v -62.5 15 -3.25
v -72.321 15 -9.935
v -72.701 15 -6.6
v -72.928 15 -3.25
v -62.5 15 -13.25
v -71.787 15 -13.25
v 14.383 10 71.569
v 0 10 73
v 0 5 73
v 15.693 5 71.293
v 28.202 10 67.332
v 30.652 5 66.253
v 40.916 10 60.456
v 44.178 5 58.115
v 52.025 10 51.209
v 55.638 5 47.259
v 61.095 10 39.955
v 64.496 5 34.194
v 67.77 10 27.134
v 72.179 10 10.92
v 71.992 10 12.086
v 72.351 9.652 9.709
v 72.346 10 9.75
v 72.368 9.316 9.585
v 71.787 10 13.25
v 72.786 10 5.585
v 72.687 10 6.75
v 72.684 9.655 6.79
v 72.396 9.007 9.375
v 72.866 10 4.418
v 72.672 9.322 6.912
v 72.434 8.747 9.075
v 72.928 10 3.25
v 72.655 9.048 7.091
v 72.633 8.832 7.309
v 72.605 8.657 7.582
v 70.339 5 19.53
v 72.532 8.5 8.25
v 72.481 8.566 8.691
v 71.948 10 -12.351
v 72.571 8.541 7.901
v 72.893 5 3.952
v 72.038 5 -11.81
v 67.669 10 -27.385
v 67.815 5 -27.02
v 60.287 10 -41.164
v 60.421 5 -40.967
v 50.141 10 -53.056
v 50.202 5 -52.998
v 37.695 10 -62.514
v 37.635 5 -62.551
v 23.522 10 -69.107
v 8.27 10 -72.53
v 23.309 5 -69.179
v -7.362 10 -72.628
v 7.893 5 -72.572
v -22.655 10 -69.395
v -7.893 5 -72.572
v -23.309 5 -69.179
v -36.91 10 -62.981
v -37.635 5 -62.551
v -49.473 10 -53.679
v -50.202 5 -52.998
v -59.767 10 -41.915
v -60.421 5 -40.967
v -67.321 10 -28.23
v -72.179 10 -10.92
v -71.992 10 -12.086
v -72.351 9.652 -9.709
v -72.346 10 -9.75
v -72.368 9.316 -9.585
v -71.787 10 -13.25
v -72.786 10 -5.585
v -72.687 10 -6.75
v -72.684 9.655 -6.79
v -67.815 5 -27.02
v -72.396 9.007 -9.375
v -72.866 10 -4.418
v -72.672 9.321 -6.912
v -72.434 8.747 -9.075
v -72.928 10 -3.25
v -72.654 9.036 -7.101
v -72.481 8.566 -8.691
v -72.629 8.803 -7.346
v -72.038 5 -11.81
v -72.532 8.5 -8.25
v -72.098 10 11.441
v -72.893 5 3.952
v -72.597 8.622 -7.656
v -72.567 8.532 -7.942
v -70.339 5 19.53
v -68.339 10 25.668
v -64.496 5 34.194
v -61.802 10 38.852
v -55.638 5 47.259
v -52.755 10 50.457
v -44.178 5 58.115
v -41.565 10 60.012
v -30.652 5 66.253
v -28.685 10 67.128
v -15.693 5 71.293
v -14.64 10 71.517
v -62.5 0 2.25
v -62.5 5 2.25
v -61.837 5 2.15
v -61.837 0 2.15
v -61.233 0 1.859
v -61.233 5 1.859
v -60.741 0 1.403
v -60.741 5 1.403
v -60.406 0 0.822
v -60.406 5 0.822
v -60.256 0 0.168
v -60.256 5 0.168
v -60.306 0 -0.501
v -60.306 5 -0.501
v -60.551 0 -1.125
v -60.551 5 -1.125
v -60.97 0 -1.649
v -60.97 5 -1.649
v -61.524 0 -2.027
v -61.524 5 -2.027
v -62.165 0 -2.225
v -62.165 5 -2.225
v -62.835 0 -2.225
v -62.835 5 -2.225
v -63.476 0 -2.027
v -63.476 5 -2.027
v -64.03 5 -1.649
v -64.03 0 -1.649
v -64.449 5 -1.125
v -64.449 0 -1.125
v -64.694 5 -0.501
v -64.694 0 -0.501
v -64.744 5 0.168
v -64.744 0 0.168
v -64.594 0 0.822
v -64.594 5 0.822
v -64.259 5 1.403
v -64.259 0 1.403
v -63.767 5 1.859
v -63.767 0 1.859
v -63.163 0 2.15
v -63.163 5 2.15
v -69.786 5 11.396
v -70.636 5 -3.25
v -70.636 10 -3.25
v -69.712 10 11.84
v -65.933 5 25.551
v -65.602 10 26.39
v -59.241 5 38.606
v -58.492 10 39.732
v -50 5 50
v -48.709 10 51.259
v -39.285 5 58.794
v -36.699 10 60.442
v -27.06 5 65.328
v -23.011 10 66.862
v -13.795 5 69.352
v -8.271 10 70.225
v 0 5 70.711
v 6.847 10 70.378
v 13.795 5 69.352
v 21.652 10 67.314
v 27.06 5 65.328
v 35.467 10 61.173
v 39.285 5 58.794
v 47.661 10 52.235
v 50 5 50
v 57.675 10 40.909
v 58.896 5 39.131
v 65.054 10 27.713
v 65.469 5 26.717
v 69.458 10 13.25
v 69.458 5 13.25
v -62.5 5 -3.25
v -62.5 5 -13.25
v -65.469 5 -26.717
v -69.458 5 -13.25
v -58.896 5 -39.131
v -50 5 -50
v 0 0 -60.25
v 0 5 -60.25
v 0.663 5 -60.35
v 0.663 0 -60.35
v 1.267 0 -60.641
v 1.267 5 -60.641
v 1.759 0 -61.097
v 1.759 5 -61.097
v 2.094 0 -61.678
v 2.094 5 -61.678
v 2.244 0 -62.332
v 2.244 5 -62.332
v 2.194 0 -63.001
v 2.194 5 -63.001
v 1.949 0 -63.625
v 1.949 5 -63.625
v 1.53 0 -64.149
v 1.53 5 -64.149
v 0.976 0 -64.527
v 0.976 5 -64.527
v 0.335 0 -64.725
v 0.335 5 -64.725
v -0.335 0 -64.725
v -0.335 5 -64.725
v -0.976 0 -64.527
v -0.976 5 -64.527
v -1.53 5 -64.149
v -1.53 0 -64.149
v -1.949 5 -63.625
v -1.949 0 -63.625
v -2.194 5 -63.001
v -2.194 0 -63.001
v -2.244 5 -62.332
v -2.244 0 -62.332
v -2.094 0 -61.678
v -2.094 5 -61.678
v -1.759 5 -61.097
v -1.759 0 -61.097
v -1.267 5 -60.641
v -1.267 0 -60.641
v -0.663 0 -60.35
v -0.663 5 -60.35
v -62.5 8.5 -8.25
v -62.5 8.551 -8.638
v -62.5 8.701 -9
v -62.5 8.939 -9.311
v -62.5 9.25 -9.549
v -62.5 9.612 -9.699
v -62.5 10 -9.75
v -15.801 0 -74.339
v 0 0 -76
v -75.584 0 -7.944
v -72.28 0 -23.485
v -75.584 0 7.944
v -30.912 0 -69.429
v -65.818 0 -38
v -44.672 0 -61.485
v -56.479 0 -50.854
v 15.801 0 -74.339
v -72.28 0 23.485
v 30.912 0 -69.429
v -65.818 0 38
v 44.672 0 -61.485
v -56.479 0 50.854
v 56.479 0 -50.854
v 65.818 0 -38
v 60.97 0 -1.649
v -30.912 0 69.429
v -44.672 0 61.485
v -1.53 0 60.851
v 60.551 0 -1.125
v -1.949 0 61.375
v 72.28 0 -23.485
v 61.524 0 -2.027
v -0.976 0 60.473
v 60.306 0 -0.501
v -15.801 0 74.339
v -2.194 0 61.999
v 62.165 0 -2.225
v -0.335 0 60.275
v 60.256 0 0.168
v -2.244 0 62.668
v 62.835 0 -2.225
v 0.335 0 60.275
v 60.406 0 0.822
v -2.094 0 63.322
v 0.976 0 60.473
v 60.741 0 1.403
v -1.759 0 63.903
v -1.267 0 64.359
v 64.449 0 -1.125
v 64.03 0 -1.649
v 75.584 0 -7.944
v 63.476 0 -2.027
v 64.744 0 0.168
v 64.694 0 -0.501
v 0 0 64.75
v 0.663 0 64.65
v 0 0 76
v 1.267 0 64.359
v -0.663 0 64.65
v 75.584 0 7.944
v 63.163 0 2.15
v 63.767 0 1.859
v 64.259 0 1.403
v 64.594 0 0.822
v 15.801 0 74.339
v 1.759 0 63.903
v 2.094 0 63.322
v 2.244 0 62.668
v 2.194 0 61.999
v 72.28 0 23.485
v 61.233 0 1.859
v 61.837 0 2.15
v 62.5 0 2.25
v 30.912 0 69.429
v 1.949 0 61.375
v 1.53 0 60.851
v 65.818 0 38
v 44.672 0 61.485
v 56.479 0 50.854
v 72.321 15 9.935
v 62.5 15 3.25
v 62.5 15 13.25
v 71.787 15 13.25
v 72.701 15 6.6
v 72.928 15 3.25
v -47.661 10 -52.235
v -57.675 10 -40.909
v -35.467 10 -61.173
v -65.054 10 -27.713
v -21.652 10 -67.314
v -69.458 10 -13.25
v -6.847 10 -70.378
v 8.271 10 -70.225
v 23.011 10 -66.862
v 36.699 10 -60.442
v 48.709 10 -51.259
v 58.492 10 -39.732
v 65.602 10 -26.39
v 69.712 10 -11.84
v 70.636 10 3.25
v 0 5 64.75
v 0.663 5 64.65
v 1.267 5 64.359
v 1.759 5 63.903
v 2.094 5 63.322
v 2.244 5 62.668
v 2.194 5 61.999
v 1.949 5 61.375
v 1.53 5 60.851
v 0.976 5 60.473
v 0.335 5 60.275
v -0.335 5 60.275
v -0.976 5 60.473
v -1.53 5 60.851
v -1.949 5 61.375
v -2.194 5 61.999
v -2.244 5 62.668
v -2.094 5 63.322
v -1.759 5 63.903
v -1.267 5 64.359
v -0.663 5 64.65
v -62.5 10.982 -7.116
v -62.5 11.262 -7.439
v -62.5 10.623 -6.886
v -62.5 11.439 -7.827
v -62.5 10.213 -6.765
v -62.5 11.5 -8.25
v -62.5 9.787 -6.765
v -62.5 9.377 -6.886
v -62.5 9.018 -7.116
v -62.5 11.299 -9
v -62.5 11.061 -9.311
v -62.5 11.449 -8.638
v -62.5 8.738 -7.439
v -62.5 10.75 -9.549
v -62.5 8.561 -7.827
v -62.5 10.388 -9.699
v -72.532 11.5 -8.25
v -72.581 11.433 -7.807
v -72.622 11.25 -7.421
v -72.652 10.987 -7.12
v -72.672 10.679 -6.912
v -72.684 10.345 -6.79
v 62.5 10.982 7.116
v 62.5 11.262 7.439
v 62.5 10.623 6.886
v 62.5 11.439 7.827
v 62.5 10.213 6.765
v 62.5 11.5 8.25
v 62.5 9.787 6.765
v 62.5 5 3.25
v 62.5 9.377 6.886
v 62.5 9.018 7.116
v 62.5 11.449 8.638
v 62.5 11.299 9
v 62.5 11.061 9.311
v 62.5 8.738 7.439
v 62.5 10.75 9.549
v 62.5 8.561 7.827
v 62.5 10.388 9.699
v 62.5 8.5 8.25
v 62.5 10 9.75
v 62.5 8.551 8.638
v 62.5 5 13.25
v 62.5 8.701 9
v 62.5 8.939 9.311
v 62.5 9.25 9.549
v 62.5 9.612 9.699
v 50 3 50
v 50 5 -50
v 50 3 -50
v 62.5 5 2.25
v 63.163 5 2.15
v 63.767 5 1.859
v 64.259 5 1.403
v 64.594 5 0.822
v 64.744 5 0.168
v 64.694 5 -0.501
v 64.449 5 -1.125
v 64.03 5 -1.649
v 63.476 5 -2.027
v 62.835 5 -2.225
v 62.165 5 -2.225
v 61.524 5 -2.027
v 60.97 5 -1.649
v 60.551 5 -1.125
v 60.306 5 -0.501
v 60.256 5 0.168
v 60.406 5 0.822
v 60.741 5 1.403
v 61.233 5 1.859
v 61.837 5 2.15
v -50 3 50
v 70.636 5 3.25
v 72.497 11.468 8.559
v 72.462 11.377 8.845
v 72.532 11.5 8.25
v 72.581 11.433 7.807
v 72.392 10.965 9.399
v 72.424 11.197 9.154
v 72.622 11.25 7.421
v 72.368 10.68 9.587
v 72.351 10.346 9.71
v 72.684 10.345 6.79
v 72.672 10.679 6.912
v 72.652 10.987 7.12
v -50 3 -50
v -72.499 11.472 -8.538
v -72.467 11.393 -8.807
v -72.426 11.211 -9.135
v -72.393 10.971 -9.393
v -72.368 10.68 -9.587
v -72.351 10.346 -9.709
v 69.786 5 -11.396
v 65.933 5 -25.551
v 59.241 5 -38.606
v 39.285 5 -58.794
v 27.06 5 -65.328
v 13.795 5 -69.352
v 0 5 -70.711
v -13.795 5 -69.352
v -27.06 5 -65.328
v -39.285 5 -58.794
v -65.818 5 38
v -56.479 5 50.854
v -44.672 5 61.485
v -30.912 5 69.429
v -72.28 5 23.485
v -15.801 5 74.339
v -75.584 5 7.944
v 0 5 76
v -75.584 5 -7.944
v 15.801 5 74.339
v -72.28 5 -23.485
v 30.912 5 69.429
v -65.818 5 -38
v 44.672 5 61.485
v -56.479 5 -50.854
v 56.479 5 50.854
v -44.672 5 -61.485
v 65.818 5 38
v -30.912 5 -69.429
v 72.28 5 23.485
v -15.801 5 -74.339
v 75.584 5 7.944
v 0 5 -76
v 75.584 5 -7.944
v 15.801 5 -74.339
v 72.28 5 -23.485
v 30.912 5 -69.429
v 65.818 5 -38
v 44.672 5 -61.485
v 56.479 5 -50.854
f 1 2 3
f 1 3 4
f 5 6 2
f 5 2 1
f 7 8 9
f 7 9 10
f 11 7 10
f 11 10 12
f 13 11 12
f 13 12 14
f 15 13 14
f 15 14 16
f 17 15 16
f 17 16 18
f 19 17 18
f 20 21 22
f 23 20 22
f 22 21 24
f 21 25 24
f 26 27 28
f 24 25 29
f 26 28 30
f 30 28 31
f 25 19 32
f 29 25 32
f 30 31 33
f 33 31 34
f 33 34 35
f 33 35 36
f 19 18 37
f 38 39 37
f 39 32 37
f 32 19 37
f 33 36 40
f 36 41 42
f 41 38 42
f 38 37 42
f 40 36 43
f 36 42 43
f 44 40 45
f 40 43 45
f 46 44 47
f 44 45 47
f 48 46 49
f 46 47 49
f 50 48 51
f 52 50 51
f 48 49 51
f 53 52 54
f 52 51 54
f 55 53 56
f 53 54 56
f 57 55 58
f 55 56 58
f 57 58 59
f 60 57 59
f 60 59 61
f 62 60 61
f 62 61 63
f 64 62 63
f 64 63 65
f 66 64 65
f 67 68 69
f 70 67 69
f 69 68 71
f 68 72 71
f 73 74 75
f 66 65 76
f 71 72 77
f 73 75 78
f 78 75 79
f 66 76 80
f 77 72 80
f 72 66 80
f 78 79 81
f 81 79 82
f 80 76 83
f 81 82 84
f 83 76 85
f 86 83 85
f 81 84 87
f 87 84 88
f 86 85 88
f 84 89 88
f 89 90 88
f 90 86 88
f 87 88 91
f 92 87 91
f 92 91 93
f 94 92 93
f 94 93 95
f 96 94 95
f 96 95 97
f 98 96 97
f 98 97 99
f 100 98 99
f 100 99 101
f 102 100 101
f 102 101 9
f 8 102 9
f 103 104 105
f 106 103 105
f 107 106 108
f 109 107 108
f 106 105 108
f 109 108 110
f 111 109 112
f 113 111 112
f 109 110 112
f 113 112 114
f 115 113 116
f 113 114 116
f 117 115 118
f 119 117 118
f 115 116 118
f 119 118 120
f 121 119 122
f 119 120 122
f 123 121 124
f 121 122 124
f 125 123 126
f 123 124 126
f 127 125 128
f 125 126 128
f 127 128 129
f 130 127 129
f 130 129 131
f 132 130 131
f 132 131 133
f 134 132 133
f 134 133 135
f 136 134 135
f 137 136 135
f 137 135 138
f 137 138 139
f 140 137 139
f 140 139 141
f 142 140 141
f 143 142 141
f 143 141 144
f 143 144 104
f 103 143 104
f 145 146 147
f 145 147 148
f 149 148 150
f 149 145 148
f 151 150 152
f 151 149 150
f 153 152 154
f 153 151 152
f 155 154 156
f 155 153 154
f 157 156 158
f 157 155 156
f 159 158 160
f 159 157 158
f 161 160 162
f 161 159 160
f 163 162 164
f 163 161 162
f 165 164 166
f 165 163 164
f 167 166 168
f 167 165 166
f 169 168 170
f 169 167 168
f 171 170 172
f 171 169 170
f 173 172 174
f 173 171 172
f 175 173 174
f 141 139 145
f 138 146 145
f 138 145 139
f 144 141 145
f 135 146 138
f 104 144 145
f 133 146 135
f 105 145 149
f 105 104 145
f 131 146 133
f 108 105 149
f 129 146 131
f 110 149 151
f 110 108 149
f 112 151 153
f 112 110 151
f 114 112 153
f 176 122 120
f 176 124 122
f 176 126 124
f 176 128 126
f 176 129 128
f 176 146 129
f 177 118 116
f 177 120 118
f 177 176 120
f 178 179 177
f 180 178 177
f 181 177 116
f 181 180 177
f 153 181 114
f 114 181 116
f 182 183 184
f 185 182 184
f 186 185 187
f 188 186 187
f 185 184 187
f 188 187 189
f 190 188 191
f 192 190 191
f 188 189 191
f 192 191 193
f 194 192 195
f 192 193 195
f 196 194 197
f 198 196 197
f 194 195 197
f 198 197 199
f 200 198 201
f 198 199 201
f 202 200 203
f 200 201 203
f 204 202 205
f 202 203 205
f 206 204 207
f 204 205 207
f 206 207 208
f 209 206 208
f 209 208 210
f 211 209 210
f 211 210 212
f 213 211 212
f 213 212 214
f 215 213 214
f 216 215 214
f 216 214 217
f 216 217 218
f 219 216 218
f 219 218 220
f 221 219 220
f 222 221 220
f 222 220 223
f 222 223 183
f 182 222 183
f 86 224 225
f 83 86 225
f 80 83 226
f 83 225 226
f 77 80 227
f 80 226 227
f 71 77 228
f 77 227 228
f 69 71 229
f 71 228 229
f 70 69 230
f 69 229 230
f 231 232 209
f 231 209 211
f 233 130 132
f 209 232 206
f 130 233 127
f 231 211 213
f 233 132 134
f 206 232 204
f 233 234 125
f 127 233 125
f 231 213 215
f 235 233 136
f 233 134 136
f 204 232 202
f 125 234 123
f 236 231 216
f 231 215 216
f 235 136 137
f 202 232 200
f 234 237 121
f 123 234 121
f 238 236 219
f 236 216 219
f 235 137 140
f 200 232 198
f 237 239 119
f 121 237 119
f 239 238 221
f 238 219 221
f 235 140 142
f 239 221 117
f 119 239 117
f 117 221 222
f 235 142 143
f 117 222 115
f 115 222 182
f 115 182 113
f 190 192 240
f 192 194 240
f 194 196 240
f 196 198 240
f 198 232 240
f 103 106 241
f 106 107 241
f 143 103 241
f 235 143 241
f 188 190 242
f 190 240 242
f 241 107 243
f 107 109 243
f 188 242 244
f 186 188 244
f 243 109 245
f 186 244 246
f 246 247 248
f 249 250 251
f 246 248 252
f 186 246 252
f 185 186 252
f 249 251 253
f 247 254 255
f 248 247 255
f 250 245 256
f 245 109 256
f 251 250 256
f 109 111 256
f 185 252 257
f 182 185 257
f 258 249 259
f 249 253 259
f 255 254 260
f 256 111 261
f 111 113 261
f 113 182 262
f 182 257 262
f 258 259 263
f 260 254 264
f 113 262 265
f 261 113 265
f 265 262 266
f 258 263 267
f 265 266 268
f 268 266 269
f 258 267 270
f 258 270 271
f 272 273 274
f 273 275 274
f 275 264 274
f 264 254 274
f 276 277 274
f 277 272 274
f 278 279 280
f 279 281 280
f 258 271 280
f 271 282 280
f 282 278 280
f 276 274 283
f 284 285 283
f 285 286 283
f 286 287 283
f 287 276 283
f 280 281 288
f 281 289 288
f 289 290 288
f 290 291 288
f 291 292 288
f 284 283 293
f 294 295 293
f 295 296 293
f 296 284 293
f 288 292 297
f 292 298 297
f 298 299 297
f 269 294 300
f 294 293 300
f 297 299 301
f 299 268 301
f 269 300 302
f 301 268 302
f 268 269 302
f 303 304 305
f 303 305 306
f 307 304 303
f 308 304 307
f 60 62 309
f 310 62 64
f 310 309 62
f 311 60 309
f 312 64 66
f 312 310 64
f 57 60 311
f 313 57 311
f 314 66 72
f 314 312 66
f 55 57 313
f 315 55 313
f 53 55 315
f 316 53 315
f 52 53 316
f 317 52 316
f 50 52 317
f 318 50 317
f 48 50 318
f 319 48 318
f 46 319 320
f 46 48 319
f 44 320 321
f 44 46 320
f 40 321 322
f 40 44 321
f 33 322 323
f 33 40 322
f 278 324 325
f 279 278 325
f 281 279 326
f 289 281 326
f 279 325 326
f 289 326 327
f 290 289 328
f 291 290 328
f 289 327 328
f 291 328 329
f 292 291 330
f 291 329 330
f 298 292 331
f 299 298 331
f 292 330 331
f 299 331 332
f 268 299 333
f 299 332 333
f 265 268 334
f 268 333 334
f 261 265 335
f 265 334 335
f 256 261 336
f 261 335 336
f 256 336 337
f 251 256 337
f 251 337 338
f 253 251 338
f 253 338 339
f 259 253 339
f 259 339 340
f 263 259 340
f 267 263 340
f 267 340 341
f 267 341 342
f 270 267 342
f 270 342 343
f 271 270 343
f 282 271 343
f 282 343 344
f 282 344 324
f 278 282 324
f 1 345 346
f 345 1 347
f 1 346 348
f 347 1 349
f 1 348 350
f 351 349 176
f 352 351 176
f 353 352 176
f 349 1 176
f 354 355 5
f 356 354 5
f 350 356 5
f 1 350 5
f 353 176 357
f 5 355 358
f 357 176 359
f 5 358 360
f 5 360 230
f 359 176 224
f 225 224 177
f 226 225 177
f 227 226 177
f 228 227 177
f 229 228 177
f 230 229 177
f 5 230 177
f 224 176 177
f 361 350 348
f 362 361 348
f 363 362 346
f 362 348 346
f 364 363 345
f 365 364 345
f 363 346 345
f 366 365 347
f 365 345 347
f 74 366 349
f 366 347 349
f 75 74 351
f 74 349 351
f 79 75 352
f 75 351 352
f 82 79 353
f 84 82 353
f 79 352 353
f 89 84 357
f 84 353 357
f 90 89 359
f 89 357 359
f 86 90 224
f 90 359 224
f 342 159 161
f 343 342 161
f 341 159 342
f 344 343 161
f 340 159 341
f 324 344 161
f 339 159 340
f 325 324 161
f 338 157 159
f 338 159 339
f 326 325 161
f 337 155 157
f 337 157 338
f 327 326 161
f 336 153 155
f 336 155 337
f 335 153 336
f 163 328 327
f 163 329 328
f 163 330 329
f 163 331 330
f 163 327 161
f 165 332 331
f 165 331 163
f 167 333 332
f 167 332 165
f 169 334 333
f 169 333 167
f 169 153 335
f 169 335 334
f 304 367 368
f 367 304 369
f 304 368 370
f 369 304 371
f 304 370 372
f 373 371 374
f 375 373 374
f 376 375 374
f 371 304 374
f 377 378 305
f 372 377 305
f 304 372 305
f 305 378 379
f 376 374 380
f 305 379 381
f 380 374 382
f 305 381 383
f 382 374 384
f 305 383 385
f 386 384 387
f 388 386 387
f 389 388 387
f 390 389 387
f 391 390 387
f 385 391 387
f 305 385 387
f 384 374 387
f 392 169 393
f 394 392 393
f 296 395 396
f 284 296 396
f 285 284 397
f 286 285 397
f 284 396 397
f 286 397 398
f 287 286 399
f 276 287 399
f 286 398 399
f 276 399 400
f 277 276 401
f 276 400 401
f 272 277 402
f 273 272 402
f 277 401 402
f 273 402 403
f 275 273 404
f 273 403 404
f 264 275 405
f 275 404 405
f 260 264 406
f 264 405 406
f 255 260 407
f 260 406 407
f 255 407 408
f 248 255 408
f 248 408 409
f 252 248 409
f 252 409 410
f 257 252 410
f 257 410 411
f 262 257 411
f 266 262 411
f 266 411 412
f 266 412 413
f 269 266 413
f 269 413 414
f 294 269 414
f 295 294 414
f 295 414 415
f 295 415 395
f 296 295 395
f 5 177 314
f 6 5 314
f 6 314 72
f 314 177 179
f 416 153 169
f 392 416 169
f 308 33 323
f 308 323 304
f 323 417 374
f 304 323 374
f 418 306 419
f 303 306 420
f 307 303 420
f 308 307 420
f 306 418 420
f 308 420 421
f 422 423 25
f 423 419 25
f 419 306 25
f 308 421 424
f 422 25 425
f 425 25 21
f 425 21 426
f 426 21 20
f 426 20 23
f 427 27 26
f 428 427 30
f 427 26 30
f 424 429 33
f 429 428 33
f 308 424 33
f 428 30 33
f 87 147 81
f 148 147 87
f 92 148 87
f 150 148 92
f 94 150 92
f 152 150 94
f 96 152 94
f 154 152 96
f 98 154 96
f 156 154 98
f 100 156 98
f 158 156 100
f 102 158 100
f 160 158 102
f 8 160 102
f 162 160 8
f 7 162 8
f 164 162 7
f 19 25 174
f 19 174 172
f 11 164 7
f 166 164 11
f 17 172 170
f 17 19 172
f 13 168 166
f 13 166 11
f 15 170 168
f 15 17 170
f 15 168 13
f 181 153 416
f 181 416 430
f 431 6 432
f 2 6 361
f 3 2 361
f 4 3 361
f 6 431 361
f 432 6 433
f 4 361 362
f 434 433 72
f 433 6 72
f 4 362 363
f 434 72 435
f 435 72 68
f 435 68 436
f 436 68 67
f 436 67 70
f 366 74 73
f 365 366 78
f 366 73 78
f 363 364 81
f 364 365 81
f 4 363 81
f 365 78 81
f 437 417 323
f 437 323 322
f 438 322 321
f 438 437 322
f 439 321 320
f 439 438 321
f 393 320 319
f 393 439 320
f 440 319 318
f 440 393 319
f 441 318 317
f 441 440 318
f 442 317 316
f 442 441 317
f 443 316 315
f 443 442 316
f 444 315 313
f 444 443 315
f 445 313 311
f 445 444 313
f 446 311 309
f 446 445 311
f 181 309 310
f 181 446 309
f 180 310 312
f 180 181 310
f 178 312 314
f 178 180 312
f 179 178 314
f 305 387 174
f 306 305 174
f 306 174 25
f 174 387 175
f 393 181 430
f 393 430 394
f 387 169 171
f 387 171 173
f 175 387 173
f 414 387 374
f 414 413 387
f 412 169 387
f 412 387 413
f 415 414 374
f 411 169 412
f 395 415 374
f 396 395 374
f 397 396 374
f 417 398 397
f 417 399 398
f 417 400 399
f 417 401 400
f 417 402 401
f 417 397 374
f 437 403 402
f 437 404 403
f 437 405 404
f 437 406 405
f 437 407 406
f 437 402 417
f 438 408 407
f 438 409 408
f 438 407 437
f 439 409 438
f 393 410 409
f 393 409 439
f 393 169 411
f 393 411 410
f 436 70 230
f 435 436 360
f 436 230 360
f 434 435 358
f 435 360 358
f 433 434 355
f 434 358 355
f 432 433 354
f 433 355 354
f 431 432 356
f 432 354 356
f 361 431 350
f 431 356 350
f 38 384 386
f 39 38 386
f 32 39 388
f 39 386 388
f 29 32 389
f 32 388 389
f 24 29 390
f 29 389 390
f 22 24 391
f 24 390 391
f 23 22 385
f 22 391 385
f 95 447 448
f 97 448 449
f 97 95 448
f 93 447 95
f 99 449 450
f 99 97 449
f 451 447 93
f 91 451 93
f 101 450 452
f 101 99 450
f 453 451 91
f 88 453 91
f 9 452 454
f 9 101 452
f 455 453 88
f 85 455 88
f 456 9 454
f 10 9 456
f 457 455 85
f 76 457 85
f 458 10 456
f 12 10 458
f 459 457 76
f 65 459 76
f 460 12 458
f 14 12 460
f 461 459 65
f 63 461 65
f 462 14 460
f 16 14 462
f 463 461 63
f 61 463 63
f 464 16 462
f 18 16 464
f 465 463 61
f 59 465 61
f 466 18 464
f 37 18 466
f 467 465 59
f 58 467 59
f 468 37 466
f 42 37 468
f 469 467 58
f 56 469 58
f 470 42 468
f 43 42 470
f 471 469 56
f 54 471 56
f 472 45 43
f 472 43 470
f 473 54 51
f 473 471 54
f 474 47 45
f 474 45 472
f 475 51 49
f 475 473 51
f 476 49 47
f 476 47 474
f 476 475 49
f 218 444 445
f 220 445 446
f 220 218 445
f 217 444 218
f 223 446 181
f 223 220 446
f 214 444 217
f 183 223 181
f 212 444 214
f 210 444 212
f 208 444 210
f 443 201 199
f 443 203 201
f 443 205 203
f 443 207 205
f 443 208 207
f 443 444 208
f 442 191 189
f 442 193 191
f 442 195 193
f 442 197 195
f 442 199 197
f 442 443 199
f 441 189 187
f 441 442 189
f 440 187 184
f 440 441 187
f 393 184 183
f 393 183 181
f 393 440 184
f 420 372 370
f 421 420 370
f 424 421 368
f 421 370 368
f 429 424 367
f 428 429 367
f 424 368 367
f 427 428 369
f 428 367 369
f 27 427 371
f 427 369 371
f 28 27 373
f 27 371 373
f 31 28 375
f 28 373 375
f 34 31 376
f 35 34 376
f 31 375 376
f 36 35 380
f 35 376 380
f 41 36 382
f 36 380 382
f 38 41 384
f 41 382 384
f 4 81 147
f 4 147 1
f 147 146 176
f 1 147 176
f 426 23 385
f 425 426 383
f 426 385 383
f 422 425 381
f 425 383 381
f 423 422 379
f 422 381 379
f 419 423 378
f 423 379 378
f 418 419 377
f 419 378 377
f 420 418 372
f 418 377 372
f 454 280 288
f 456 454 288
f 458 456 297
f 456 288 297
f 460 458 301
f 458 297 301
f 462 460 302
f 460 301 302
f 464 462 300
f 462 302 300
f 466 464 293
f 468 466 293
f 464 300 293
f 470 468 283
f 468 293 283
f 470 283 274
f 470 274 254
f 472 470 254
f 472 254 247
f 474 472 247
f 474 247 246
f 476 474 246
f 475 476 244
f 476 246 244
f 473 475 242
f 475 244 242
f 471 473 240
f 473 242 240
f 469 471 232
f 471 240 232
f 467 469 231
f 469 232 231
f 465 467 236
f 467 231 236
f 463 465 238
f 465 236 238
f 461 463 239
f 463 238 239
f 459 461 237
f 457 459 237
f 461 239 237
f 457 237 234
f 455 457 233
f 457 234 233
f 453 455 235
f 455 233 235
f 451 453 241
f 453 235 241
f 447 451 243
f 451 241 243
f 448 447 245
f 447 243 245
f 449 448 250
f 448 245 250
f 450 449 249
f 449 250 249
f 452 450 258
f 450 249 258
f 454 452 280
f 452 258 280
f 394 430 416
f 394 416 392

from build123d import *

# Parameters (mm, degrees)
SKETCH1_R           = 76
SKETCH1_W           = 100
SKETCH1_H           = 100
BOSS_EXTRUDE1_DEPTH = 5
SKETCH3_W           = 100
SKETCH3_H           = 100
BOSS_EXTRUDE2_DEPTH = 5
SKETCH3_2_W         = 100
SKETCH3_2_H         = 100
CUT_EXTRUDE1_DEPTH  = 2
SKETCH6_R           = 2.25
CUT_EXTRUDE2_DEPTH  = 10
SKETCH8_R           = 73
SKETCH8_R_2         = 70.710678119
BOSS_EXTRUDE3_DEPTH = 5
BOSS_EXTRUDE4_DEPTH = 10
BOSS_EXTRUDE5_DEPTH = 5
BOSS_EXTRUDE7_DEPTH = 10
BOSS_EXTRUDE8_DEPTH = 5
SKETCH17_R          = 1.5
CUT_EXTRUDE3_DEPTH  = 27
SKETCH18_R          = 1.5
CUT_EXTRUDE4_DEPTH  = 27


with BuildPart() as part:
    # Sketch1 → Boss-Extrude1 (new body)
    with BuildSketch(Plane(origin=(0, 0, 0), x_dir=(1, 0, 0), z_dir=(0, 1, 0))):
        Circle(SKETCH1_R)
        Rectangle(SKETCH1_W, SKETCH1_H, mode=Mode.SUBTRACT)
    extrude(amount=BOSS_EXTRUDE1_DEPTH)

    # Sketch3 → Boss-Extrude2 (add)
    with BuildSketch(Plane(origin=(0, 5, 0), x_dir=(1, 0, 0), z_dir=(0, 1, 0))):
        Rectangle(SKETCH3_W, SKETCH3_H)
    extrude(amount=-BOSS_EXTRUDE2_DEPTH)

    # Sketch3<2> → Cut-Extrude1 (cut)
    with BuildSketch(Plane(origin=(0, 5, 0), x_dir=(1, 0, 0), z_dir=(0, 1, 0))):
        Rectangle(SKETCH3_2_W, SKETCH3_2_H)
    extrude(amount=-CUT_EXTRUDE1_DEPTH, mode=Mode.SUBTRACT)

    # Sketch6 → Cut-Extrude2 (cut)
    with BuildSketch(Plane(origin=(0, 5, 0), x_dir=(1, 0, 0), z_dir=(0, 1, 0))):
        with Locations((0, 62.5)):
            Circle(SKETCH6_R)
        with Locations((62.5, 0)):
            Circle(SKETCH6_R)
        with Locations((0, -62.5)):
            Circle(SKETCH6_R)
        with Locations((-62.5, 0)):
            Circle(SKETCH6_R)
    extrude(amount=-CUT_EXTRUDE2_DEPTH, mode=Mode.SUBTRACT)

    # Sketch8 → Boss-Extrude3 (add)
    with BuildSketch(Plane(origin=(0, 5, 0), x_dir=(1, 0, 0), z_dir=(0, 1, 0))):
        Circle(SKETCH8_R)
        Circle(SKETCH8_R_2, mode=Mode.SUBTRACT)
    extrude(amount=BOSS_EXTRUDE3_DEPTH)

    # Sketch11 → Boss-Extrude4 (add)
    with BuildSketch(Plane(origin=(0, 5, 0), x_dir=(1, 0, 0), z_dir=(0, 1, 0))):
        with BuildLine():
            Line((70.635950478, -3.25), (62.5, -3.25))
            Line((62.5, -3.25), (62.5, -13.25))
            Line((62.5, -13.25), (69.458170866, -13.25))
            ThreePointArc((69.458170866, -13.25), (70.225285395, -8.270990945), (70.635950478, -3.25))
        make_face()
    extrude(amount=BOSS_EXTRUDE4_DEPTH)

    # Sketch12 → Boss-Extrude5 (add)
    with BuildSketch(Plane(origin=(0, 10, 0), x_dir=(1, 0, 0), z_dir=(0, 1, 0))):
        with BuildLine():
            Line((72.927618225, -3.25), (70.635950478, -3.25))
            ThreePointArc((70.635950478, -3.25), (70.225285395, -8.270990945), (69.458170866, -13.25))
            Line((69.458170866, -13.25), (71.787446674, -13.25))
            ThreePointArc((71.787446674, -13.25), (72.530079982, -8.269673379), (72.927618225, -3.25))
        make_face()
    extrude(amount=BOSS_EXTRUDE5_DEPTH)

    # Sketch13 → Boss-Extrude7 (add)
    with BuildSketch(Plane(origin=(0, 5, 0), x_dir=(1, 0, 0), z_dir=(0, 1, 0))):
        with BuildLine():
            Line((-70.635950478, 3.25), (-62.5, 3.25))
            Line((-62.5, 3.25), (-62.5, 13.25))
            Line((-62.5, 13.25), (-69.458170866, 13.25))
            ThreePointArc((-69.458170866, 13.25), (-70.225285395, 8.270990945), (-70.635950478, 3.25))
        make_face()
    extrude(amount=BOSS_EXTRUDE7_DEPTH)

    # Sketch14 → Boss-Extrude8 (add)
    with BuildSketch(Plane(origin=(0, 10, 0), x_dir=(1, 0, 0), z_dir=(0, 1, 0))):
        with BuildLine():
            Line((-69.458170866, 13.25), (-71.787446674, 13.25))
            ThreePointArc((-71.787446674, 13.25), (-72.530079982, 8.269673379), (-72.927618225, 3.25))
            Line((-72.927618225, 3.25), (-70.635950478, 3.25))
            ThreePointArc((-70.635950478, 3.25), (-70.225285395, 8.270990945), (-69.458170866, 13.25))
        make_face()
    extrude(amount=BOSS_EXTRUDE8_DEPTH)

    # Sketch17 → Cut-Extrude3 (cut)
    with BuildSketch(Plane(origin=(-62.5, 0, 0), x_dir=(0, 0, -1), z_dir=(1, 0, 0))):
        with Locations((8.25, 10)):
            Circle(SKETCH17_R)
    extrude(amount=-CUT_EXTRUDE3_DEPTH, mode=Mode.SUBTRACT)

    # Sketch18 → Cut-Extrude4 (cut)
    with BuildSketch(Plane.ZY.offset(-62.5)):
        with Locations((8.25, 10)):
            Circle(SKETCH18_R)
    extrude(amount=-CUT_EXTRUDE4_DEPTH, mode=Mode.SUBTRACT)


solid = part.part
